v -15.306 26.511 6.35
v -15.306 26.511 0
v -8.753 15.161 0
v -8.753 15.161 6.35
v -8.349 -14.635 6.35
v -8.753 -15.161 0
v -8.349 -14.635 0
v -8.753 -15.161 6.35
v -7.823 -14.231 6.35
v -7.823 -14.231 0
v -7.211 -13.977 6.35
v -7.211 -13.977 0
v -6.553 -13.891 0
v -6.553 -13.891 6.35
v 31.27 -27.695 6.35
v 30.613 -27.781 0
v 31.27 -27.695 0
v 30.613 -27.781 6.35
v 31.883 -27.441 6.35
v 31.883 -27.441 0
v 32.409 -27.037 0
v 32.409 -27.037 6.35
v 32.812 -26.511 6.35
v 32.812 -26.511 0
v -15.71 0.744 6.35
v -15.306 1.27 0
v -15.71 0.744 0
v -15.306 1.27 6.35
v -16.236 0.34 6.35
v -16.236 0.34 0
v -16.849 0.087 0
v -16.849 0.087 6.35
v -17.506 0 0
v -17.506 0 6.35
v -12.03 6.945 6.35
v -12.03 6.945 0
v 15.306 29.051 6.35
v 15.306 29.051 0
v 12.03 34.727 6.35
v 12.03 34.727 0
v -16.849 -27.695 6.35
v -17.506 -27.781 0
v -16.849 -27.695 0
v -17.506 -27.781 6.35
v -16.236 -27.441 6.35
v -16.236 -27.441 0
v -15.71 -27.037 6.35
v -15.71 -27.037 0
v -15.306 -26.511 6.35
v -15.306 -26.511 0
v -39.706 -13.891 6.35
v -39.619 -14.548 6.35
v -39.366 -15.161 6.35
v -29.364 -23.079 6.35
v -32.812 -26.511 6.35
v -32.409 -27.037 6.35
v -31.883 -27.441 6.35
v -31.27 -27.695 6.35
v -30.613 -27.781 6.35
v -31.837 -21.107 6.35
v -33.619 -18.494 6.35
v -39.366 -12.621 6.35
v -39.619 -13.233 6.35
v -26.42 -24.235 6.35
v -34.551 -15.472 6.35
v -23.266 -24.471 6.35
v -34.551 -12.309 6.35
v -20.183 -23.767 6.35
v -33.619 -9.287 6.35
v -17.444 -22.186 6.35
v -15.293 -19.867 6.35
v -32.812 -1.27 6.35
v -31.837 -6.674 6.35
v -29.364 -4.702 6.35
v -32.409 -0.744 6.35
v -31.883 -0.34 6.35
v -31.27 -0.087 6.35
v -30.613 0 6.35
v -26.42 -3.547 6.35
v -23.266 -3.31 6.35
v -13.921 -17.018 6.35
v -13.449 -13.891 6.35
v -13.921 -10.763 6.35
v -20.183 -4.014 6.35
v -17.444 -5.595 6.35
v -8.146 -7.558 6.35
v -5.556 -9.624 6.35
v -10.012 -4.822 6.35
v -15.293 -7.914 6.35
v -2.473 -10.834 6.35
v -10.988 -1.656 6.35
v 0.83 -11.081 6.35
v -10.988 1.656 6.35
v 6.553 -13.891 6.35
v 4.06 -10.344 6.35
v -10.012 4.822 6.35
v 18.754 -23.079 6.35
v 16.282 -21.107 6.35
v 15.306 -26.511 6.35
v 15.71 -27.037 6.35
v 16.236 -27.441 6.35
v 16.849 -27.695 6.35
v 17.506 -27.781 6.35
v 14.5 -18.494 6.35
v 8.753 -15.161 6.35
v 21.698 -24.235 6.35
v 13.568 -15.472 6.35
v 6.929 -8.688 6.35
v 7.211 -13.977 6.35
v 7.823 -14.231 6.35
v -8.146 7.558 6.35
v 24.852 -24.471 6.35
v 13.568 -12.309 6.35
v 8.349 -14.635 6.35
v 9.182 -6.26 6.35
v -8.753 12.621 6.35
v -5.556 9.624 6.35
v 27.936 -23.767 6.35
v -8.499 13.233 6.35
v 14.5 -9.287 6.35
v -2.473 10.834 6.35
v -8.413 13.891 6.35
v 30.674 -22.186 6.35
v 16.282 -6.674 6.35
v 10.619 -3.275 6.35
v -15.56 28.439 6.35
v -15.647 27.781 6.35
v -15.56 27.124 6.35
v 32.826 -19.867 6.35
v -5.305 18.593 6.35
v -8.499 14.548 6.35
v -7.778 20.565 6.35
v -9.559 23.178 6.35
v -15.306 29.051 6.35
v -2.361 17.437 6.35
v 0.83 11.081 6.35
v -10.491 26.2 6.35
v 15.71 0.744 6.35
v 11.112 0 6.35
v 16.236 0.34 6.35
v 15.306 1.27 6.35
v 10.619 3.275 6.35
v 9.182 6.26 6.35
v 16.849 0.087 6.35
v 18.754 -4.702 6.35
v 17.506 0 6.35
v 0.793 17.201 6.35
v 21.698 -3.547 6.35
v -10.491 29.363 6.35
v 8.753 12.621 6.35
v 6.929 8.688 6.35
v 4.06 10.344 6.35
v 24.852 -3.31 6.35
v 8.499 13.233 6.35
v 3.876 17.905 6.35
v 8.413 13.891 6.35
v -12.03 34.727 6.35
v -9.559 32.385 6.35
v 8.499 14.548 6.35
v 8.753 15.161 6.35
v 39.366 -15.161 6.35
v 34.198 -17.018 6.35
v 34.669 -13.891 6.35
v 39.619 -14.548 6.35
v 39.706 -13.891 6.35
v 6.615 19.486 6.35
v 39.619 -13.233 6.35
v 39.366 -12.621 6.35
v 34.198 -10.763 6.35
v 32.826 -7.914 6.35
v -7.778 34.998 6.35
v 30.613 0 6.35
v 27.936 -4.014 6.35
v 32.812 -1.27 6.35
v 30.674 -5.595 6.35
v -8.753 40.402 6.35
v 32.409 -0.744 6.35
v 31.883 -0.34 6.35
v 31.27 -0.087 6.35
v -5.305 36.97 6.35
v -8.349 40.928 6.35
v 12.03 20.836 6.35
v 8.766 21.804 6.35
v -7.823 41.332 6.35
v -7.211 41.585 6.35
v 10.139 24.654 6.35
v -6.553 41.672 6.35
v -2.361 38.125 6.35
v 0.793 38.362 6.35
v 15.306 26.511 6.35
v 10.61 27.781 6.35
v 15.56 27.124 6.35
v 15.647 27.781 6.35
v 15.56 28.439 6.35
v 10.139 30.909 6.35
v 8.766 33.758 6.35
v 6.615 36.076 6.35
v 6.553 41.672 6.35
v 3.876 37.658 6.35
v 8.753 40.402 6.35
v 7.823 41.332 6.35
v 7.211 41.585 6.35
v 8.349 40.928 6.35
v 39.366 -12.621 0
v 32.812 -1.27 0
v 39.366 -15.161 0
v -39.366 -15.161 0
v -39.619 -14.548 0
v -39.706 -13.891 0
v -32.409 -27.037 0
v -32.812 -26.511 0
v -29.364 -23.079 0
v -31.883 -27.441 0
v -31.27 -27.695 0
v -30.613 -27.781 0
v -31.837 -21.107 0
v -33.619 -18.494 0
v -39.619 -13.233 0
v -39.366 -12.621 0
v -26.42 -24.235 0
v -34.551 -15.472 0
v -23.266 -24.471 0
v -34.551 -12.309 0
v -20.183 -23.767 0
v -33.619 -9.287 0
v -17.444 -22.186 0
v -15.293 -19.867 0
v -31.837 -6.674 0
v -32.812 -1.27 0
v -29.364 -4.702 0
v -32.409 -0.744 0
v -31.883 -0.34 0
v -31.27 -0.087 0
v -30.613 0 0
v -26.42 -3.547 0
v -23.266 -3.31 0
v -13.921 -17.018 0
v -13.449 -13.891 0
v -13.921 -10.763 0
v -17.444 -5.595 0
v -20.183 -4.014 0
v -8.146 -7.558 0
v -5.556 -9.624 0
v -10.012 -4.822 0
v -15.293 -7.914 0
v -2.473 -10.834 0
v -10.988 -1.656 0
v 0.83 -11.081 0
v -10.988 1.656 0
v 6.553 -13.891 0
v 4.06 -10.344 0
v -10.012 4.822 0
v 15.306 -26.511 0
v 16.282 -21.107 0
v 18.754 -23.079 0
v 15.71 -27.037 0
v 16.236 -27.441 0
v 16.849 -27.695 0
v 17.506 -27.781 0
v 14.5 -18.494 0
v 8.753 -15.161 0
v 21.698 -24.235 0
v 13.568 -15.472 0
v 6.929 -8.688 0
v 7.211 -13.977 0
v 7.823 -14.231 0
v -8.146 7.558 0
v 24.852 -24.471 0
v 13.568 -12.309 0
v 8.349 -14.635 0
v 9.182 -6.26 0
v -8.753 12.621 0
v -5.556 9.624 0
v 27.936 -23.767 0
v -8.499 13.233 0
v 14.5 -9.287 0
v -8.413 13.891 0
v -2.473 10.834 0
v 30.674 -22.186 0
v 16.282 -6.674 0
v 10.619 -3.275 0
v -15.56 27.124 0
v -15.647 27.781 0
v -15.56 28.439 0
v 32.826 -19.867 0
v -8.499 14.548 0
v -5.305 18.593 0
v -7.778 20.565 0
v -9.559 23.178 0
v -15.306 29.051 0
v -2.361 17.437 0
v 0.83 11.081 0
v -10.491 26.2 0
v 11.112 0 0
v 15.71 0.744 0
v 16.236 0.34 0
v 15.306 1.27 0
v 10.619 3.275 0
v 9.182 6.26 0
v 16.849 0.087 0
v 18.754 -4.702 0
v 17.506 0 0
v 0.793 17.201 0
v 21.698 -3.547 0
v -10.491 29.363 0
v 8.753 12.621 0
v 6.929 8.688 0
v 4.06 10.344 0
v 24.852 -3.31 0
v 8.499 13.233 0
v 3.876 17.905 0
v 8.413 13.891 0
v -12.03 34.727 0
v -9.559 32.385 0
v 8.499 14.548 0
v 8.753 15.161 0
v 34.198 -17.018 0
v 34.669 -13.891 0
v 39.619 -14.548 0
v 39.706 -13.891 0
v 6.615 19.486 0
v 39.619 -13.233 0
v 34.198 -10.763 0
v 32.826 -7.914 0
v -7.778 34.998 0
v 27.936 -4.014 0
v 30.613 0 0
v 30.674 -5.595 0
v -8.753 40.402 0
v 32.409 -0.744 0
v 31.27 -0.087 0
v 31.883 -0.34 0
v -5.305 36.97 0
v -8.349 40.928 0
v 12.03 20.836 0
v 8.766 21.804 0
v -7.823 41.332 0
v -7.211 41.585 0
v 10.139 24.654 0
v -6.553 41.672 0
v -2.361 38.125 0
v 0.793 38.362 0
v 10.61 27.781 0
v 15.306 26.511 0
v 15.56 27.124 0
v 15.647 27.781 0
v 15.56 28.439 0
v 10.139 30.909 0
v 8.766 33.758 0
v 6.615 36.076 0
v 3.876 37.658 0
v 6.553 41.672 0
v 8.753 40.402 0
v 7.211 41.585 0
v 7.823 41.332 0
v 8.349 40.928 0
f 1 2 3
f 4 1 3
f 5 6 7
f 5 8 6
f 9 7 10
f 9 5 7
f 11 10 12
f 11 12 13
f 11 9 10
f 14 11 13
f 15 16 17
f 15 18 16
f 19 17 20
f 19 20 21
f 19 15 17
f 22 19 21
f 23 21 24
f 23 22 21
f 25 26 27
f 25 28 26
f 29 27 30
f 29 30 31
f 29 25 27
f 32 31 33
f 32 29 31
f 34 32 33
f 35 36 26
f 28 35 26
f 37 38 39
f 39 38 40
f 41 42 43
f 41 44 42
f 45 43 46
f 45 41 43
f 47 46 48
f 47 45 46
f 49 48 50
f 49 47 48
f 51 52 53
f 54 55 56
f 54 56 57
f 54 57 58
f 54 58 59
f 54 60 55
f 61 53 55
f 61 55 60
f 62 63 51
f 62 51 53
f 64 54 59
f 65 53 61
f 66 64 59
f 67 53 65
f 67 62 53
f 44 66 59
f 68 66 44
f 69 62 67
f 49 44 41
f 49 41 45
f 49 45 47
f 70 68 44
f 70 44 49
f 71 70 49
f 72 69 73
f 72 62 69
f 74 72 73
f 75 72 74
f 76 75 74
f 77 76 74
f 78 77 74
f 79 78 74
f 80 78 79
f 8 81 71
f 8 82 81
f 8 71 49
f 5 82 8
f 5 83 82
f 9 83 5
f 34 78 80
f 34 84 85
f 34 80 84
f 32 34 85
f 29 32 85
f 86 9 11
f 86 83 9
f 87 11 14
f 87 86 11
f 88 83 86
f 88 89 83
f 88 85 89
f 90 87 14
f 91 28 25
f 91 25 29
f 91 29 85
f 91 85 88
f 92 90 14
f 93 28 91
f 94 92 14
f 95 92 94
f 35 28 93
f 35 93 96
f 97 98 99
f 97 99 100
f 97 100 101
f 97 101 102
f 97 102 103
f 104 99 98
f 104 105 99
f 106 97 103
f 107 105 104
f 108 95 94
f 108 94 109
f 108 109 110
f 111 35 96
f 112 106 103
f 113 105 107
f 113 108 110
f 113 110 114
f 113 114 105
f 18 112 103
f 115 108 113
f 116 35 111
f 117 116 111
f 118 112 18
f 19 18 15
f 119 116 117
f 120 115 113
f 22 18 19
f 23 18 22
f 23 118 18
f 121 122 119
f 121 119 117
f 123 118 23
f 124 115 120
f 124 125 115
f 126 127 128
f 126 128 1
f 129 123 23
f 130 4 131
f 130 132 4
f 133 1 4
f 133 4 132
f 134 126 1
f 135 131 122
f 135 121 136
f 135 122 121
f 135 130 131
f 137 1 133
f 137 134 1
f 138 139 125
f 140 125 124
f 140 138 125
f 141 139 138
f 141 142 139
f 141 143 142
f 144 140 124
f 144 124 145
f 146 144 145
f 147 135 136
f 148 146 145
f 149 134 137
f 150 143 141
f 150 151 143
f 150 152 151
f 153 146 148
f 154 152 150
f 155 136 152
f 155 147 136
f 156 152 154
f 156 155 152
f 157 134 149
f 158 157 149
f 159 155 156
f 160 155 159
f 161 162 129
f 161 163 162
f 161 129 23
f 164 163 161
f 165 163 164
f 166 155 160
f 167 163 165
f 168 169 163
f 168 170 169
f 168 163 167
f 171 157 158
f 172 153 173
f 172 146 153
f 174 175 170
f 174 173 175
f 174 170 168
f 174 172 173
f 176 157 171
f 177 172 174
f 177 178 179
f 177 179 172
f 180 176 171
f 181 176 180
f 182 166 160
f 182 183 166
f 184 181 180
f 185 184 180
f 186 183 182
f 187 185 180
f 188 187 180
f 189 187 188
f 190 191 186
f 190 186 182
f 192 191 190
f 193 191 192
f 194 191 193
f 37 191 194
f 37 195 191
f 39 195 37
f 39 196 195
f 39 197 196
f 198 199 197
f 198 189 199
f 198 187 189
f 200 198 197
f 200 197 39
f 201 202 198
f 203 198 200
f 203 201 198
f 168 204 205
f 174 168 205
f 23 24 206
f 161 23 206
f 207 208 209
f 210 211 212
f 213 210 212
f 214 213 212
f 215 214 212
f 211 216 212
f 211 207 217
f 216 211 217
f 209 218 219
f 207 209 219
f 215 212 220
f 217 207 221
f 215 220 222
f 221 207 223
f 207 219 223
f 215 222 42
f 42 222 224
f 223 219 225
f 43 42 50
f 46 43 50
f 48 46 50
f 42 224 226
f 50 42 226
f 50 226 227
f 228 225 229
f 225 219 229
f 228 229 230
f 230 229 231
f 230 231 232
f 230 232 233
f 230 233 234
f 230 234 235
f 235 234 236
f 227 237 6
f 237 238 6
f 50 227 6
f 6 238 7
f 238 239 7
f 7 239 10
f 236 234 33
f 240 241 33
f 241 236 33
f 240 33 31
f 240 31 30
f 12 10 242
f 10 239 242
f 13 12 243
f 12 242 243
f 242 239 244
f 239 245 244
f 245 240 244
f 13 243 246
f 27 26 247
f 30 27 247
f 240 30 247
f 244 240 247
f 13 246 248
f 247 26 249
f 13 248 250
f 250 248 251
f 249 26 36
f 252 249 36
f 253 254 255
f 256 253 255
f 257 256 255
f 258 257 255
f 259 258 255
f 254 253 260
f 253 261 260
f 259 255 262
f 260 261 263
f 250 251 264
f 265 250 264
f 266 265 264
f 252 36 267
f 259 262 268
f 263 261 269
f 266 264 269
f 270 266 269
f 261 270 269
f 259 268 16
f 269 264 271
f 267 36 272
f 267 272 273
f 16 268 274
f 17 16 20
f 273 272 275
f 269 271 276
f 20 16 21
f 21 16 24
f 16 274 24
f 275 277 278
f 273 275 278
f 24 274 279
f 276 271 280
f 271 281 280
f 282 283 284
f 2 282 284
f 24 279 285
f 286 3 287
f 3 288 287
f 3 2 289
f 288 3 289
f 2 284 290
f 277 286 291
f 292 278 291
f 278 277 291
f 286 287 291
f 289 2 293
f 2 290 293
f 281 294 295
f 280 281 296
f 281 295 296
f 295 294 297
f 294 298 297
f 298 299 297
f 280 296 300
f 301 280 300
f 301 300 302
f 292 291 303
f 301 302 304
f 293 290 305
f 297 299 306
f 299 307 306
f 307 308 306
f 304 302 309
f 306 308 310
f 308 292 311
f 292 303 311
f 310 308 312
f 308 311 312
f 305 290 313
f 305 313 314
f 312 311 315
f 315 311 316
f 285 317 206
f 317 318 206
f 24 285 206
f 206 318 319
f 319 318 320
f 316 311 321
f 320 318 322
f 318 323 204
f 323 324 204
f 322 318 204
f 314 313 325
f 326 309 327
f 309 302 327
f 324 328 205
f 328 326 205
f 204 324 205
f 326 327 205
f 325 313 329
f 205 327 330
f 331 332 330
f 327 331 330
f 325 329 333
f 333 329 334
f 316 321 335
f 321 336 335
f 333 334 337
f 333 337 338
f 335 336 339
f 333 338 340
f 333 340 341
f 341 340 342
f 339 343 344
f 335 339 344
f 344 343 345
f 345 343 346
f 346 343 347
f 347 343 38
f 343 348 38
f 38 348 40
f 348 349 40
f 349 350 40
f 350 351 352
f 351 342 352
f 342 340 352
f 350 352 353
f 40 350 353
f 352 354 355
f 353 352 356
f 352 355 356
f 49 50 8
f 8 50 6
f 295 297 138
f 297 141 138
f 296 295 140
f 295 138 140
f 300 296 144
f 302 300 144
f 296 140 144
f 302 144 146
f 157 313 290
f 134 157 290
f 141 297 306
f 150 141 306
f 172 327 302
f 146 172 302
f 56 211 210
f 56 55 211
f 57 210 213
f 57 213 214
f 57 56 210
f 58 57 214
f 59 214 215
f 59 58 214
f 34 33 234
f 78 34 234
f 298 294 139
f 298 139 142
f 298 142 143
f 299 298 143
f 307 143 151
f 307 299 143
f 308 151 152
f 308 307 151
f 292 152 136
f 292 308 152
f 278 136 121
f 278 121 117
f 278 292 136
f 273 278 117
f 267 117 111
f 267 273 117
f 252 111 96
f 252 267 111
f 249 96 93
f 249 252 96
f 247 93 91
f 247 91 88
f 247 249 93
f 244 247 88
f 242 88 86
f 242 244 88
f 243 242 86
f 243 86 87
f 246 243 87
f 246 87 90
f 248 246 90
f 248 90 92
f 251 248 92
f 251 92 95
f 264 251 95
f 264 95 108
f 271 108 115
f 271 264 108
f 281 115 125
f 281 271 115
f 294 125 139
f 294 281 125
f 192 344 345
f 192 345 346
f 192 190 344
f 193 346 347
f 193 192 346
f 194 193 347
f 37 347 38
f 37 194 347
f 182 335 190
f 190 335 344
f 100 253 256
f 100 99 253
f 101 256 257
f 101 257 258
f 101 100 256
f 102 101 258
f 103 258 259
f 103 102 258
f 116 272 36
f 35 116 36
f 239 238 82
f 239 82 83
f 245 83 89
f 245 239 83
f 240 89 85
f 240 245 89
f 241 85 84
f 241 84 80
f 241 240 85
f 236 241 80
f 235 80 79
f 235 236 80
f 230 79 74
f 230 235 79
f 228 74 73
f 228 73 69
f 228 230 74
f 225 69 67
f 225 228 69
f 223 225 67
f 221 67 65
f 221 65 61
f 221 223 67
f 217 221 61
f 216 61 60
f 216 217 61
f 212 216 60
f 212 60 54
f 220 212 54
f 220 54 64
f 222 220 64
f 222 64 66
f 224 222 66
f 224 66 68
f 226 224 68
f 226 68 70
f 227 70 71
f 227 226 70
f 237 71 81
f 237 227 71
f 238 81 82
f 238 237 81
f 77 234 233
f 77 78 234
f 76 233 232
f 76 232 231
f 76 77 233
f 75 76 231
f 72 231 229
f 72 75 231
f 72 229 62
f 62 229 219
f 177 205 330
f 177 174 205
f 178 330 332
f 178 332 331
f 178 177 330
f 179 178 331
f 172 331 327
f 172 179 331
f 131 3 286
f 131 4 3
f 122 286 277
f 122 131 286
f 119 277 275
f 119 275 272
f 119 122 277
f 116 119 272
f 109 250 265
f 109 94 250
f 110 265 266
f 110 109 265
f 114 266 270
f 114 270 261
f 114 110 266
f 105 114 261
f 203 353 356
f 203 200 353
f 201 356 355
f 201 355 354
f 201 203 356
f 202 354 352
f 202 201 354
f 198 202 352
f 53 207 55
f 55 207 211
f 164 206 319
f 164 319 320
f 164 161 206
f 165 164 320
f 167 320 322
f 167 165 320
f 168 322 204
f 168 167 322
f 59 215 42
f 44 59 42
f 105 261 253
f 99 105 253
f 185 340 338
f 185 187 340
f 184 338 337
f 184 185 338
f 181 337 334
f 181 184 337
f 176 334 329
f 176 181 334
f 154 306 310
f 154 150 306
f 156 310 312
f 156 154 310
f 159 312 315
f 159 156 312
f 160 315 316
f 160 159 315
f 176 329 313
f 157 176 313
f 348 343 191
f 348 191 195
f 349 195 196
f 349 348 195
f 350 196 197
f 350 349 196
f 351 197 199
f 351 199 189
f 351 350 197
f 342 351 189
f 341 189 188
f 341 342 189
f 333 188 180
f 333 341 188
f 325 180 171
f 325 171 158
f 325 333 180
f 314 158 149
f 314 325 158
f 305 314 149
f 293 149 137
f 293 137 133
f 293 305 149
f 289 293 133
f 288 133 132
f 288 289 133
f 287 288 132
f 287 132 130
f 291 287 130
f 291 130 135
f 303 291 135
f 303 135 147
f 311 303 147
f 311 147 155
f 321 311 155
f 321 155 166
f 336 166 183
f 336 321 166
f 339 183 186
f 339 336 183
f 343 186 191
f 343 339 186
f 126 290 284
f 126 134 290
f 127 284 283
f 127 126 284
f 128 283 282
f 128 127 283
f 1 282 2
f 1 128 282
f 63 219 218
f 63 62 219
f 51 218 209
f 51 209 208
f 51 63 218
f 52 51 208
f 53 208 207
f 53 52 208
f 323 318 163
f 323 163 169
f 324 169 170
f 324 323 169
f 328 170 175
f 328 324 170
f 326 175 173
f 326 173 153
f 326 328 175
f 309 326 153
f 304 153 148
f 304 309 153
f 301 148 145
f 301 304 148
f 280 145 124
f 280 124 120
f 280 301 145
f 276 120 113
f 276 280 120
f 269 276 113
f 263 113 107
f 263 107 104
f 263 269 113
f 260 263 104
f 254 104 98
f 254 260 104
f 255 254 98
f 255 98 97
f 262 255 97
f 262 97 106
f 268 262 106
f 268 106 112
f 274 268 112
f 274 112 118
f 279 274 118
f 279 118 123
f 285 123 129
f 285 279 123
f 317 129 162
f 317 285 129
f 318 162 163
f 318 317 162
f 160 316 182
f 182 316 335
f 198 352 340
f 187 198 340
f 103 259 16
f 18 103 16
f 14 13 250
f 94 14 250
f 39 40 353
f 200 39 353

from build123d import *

# Parameters (mm, degrees)
F0_R     = 11.1125
F0_R_2   = 10.61
F1_DEPTH = 6.35
F2_R     = 2.54


with BuildPart() as f1:
    # F0 (on Top) → F1 (new body)
    with BuildSketch(Plane.XY):
        with BuildLine():
            ThreePointArc((12.029634049, -6.9453126307), (13.4173134113, -3.5951583713), (13.890625, 0))
            ThreePointArc((13.890625, 0), (13.4173134613, 3.5951581844), (12.0296342424, 6.9453122957))
            ThreePointArc((12.0296342424, 6.9453122957), (6.9453126033, 12.0296340648), (2.8e-09, 13.890625))
            ThreePointArc((2.8e-09, 13.890625), (-6.9453125381, 12.0296341025), (-12.0296341698, 6.9453124214))
            ThreePointArc((-12.0296341698, 6.9453124214), (-13.890625, 1.22e-08), (-12.029634182, -6.9453124002))
            ThreePointArc((-12.029634182, -6.9453124002), (-6.9453125499, -12.0296340956), (0, -13.890625))
            ThreePointArc((0, -13.890625), (6.9453124346, -12.0296341622), (12.029634049, -6.9453126307))
        make_face()
        Circle(F0_R, mode=Mode.SUBTRACT)
        with BuildLine():
            ThreePointArc((12.0296342424, 6.9453122957), (13.4173134613, 3.5951581844), (13.890625, 0))
            ThreePointArc((13.890625, 0), (13.4173134113, -3.5951583713), (12.029634049, -6.9453126307))
            Line((12.029634049, -6.9453126307), (16.0395121659, 0))
            Line((16.0395121659, 0), (12.0296342424, 6.9453122957))
        make_face()
        with BuildLine():
            ThreePointArc((2.8e-09, 13.890625), (6.9453126033, 12.0296340648), (12.0296342424, 6.9453122957))
            Line((12.0296342424, 6.9453122957), (8.019756083, 13.890625))
            Line((8.019756083, 13.890625), (2.8e-09, 13.890625))
        make_face()
        with BuildLine():
            Line((8.019756083, -13.890625), (12.029634049, -6.9453126307))
            ThreePointArc((12.029634049, -6.9453126307), (6.9453124346, -12.0296341622), (0, -13.890625))
            Line((0, -13.890625), (8.019756083, -13.890625))
        make_face()
        Polygon((16.0395121659, 0), (12.029634049, -6.9453126307), (8.019756083, -13.890625), (16.0395121659, -27.78125), (32.0790243318, -27.78125), (40.0987804148, -13.890625), (32.0790243318, 0), align=None)
        with Locations((24.0592682489, -13.890625)):
            Circle(F0_R_2, mode=Mode.SUBTRACT)
        with BuildLine():
            ThreePointArc((-12.0296341698, 6.9453124214), (-6.9453125381, 12.0296341025), (2.8e-09, 13.890625))
            Line((2.8e-09, 13.890625), (-8.019756083, 13.890625))
            Line((-8.019756083, 13.890625), (-12.0296341698, 6.9453124214))
        make_face()
        with BuildLine():
            ThreePointArc((12.0296340896, 20.8359374397), (6.945312471, 15.7516158588), (2.8e-09, 13.890625))
            Line((2.8e-09, 13.890625), (8.019756083, 13.890625))
            Line((8.019756083, 13.890625), (12.0296340896, 20.8359374397))
        make_face()
        with BuildLine():
            Line((-8.019756083, 13.890625), (2.8e-09, 13.890625))
            ThreePointArc((2.8e-09, 13.890625), (-6.9453126113, 15.7516159398), (-12.0296342543, 20.8359377249))
            Line((-12.0296342543, 20.8359377249), (-8.019756083, 13.890625))
        make_face()
        with BuildLine():
            ThreePointArc((-12.0296342543, 20.8359377249), (-6.9453126113, 15.7516159398), (2.8e-09, 13.890625))
            ThreePointArc((2.8e-09, 13.890625), (6.945312471, 15.7516158588), (12.0296340896, 20.8359374397))
            ThreePointArc((12.0296340896, 20.8359374397), (13.4173134218, 24.186091668), (13.890625, 27.78125))
            ThreePointArc((13.890625, 27.78125), (13.4173134908, 31.3764080746), (12.0296343561, 34.7265620987))
            ThreePointArc((12.0296343561, 34.7265620987), (6.9453127227, 39.8108839959), (5.09e-08, 41.671875))
            ThreePointArc((5.09e-08, 41.671875), (-6.9453124478, 39.8108841546), (-12.0296340896, 34.7265625603))
            ThreePointArc((-12.0296340896, 34.7265625603), (-13.890625, 27.7812501647), (-12.0296342543, 20.8359377249))
        make_face()
        with Locations((0, 27.78125)):
            Circle(F0_R_2, mode=Mode.SUBTRACT)
        with BuildLine():
            Line((-8.019756083, -13.890625), (0, -13.890625))
            ThreePointArc((0, -13.890625), (-6.9453125499, -12.0296340956), (-12.029634182, -6.9453124002))
            Line((-12.029634182, -6.9453124002), (-8.019756083, -13.890625))
        make_face()
        with BuildLine():
            ThreePointArc((-12.029634182, -6.9453124002), (-13.890625, 1.22e-08), (-12.0296341698, 6.9453124214))
            Line((-12.0296341698, 6.9453124214), (-16.0395121659, 0))
            Line((-16.0395121659, 0), (-12.029634182, -6.9453124002))
        make_face()
        with BuildLine():
            Line((-16.0395121659, 27.78125), (-12.0296342543, 20.8359377249))
            ThreePointArc((-12.0296342543, 20.8359377249), (-13.890625, 27.7812501647), (-12.0296340896, 34.7265625603))
            Line((-12.0296340896, 34.7265625603), (-16.0395121659, 27.78125))
        make_face()
        with BuildLine():
            ThreePointArc((13.890625, 27.78125), (13.4173134218, 24.186091668), (12.0296340896, 20.8359374397))
            Line((12.0296340896, 20.8359374397), (16.0395121659, 27.78125))
            Line((16.0395121659, 27.78125), (12.0296343561, 34.7265620987))
            ThreePointArc((12.0296343561, 34.7265620987), (13.4173134908, 31.3764080746), (13.890625, 27.78125))
        make_face()
        Polygon((-8.019756083, -13.890625), (-12.029634182, -6.9453124002), (-16.0395121659, 0), (-32.0790243318, 0), (-40.0987804148, -13.890625), (-32.0790243318, -27.78125), (-16.0395121659, -27.78125), align=None)
        with Locations((-24.0592682489, -13.890625)):
            Circle(F0_R_2, mode=Mode.SUBTRACT)
        with BuildLine():
            Line((-8.019756083, 41.671875), (-12.0296340896, 34.7265625603))
            ThreePointArc((-12.0296340896, 34.7265625603), (-6.9453124478, 39.8108841546), (5.09e-08, 41.671875))
            Line((5.09e-08, 41.671875), (-8.019756083, 41.671875))
        make_face()
        with BuildLine():
            Line((8.019756083, 41.671875), (5.09e-08, 41.671875))
            ThreePointArc((5.09e-08, 41.671875), (6.9453127227, 39.8108839959), (12.0296343561, 34.7265620987))
            Line((12.0296343561, 34.7265620987), (8.019756083, 41.671875))
        make_face()
    extrude(amount=F1_DEPTH)

    # F2
    f2_edges = [f1.edges().sort_by_distance(p)[0] for p in [
        (-8.019756, -13.890625, 3.175),
        (8.019756, -13.890625, 3.175),
        (16.039512, -27.78125, 3.175),
        (32.079024, -27.78125, 3.175),
        (40.09878, -13.890625, 3.175),
        (-16.039512, -27.78125, 3.175),
        (-32.079024, -27.78125, 3.175),
        (-40.09878, -13.890625, 3.175),
        (32.079024, 0, 3.175),
        (16.039512, 0, 3.175),
        (16.039512, 27.78125, 3.175),
        (8.019756, 41.671875, 3.175),
        (-8.019756, 41.671875, 3.175),
        (8.019756, 13.890625, 3.175),
        (-16.039512, 27.78125, 3.175),
        (-8.019756, 13.890625, 3.175),
        (-16.039512, 0, 3.175),
        (-32.079024, 0, 3.175),
    ]]
    fillet(f2_edges, radius=F2_R)


solid = f1.part
